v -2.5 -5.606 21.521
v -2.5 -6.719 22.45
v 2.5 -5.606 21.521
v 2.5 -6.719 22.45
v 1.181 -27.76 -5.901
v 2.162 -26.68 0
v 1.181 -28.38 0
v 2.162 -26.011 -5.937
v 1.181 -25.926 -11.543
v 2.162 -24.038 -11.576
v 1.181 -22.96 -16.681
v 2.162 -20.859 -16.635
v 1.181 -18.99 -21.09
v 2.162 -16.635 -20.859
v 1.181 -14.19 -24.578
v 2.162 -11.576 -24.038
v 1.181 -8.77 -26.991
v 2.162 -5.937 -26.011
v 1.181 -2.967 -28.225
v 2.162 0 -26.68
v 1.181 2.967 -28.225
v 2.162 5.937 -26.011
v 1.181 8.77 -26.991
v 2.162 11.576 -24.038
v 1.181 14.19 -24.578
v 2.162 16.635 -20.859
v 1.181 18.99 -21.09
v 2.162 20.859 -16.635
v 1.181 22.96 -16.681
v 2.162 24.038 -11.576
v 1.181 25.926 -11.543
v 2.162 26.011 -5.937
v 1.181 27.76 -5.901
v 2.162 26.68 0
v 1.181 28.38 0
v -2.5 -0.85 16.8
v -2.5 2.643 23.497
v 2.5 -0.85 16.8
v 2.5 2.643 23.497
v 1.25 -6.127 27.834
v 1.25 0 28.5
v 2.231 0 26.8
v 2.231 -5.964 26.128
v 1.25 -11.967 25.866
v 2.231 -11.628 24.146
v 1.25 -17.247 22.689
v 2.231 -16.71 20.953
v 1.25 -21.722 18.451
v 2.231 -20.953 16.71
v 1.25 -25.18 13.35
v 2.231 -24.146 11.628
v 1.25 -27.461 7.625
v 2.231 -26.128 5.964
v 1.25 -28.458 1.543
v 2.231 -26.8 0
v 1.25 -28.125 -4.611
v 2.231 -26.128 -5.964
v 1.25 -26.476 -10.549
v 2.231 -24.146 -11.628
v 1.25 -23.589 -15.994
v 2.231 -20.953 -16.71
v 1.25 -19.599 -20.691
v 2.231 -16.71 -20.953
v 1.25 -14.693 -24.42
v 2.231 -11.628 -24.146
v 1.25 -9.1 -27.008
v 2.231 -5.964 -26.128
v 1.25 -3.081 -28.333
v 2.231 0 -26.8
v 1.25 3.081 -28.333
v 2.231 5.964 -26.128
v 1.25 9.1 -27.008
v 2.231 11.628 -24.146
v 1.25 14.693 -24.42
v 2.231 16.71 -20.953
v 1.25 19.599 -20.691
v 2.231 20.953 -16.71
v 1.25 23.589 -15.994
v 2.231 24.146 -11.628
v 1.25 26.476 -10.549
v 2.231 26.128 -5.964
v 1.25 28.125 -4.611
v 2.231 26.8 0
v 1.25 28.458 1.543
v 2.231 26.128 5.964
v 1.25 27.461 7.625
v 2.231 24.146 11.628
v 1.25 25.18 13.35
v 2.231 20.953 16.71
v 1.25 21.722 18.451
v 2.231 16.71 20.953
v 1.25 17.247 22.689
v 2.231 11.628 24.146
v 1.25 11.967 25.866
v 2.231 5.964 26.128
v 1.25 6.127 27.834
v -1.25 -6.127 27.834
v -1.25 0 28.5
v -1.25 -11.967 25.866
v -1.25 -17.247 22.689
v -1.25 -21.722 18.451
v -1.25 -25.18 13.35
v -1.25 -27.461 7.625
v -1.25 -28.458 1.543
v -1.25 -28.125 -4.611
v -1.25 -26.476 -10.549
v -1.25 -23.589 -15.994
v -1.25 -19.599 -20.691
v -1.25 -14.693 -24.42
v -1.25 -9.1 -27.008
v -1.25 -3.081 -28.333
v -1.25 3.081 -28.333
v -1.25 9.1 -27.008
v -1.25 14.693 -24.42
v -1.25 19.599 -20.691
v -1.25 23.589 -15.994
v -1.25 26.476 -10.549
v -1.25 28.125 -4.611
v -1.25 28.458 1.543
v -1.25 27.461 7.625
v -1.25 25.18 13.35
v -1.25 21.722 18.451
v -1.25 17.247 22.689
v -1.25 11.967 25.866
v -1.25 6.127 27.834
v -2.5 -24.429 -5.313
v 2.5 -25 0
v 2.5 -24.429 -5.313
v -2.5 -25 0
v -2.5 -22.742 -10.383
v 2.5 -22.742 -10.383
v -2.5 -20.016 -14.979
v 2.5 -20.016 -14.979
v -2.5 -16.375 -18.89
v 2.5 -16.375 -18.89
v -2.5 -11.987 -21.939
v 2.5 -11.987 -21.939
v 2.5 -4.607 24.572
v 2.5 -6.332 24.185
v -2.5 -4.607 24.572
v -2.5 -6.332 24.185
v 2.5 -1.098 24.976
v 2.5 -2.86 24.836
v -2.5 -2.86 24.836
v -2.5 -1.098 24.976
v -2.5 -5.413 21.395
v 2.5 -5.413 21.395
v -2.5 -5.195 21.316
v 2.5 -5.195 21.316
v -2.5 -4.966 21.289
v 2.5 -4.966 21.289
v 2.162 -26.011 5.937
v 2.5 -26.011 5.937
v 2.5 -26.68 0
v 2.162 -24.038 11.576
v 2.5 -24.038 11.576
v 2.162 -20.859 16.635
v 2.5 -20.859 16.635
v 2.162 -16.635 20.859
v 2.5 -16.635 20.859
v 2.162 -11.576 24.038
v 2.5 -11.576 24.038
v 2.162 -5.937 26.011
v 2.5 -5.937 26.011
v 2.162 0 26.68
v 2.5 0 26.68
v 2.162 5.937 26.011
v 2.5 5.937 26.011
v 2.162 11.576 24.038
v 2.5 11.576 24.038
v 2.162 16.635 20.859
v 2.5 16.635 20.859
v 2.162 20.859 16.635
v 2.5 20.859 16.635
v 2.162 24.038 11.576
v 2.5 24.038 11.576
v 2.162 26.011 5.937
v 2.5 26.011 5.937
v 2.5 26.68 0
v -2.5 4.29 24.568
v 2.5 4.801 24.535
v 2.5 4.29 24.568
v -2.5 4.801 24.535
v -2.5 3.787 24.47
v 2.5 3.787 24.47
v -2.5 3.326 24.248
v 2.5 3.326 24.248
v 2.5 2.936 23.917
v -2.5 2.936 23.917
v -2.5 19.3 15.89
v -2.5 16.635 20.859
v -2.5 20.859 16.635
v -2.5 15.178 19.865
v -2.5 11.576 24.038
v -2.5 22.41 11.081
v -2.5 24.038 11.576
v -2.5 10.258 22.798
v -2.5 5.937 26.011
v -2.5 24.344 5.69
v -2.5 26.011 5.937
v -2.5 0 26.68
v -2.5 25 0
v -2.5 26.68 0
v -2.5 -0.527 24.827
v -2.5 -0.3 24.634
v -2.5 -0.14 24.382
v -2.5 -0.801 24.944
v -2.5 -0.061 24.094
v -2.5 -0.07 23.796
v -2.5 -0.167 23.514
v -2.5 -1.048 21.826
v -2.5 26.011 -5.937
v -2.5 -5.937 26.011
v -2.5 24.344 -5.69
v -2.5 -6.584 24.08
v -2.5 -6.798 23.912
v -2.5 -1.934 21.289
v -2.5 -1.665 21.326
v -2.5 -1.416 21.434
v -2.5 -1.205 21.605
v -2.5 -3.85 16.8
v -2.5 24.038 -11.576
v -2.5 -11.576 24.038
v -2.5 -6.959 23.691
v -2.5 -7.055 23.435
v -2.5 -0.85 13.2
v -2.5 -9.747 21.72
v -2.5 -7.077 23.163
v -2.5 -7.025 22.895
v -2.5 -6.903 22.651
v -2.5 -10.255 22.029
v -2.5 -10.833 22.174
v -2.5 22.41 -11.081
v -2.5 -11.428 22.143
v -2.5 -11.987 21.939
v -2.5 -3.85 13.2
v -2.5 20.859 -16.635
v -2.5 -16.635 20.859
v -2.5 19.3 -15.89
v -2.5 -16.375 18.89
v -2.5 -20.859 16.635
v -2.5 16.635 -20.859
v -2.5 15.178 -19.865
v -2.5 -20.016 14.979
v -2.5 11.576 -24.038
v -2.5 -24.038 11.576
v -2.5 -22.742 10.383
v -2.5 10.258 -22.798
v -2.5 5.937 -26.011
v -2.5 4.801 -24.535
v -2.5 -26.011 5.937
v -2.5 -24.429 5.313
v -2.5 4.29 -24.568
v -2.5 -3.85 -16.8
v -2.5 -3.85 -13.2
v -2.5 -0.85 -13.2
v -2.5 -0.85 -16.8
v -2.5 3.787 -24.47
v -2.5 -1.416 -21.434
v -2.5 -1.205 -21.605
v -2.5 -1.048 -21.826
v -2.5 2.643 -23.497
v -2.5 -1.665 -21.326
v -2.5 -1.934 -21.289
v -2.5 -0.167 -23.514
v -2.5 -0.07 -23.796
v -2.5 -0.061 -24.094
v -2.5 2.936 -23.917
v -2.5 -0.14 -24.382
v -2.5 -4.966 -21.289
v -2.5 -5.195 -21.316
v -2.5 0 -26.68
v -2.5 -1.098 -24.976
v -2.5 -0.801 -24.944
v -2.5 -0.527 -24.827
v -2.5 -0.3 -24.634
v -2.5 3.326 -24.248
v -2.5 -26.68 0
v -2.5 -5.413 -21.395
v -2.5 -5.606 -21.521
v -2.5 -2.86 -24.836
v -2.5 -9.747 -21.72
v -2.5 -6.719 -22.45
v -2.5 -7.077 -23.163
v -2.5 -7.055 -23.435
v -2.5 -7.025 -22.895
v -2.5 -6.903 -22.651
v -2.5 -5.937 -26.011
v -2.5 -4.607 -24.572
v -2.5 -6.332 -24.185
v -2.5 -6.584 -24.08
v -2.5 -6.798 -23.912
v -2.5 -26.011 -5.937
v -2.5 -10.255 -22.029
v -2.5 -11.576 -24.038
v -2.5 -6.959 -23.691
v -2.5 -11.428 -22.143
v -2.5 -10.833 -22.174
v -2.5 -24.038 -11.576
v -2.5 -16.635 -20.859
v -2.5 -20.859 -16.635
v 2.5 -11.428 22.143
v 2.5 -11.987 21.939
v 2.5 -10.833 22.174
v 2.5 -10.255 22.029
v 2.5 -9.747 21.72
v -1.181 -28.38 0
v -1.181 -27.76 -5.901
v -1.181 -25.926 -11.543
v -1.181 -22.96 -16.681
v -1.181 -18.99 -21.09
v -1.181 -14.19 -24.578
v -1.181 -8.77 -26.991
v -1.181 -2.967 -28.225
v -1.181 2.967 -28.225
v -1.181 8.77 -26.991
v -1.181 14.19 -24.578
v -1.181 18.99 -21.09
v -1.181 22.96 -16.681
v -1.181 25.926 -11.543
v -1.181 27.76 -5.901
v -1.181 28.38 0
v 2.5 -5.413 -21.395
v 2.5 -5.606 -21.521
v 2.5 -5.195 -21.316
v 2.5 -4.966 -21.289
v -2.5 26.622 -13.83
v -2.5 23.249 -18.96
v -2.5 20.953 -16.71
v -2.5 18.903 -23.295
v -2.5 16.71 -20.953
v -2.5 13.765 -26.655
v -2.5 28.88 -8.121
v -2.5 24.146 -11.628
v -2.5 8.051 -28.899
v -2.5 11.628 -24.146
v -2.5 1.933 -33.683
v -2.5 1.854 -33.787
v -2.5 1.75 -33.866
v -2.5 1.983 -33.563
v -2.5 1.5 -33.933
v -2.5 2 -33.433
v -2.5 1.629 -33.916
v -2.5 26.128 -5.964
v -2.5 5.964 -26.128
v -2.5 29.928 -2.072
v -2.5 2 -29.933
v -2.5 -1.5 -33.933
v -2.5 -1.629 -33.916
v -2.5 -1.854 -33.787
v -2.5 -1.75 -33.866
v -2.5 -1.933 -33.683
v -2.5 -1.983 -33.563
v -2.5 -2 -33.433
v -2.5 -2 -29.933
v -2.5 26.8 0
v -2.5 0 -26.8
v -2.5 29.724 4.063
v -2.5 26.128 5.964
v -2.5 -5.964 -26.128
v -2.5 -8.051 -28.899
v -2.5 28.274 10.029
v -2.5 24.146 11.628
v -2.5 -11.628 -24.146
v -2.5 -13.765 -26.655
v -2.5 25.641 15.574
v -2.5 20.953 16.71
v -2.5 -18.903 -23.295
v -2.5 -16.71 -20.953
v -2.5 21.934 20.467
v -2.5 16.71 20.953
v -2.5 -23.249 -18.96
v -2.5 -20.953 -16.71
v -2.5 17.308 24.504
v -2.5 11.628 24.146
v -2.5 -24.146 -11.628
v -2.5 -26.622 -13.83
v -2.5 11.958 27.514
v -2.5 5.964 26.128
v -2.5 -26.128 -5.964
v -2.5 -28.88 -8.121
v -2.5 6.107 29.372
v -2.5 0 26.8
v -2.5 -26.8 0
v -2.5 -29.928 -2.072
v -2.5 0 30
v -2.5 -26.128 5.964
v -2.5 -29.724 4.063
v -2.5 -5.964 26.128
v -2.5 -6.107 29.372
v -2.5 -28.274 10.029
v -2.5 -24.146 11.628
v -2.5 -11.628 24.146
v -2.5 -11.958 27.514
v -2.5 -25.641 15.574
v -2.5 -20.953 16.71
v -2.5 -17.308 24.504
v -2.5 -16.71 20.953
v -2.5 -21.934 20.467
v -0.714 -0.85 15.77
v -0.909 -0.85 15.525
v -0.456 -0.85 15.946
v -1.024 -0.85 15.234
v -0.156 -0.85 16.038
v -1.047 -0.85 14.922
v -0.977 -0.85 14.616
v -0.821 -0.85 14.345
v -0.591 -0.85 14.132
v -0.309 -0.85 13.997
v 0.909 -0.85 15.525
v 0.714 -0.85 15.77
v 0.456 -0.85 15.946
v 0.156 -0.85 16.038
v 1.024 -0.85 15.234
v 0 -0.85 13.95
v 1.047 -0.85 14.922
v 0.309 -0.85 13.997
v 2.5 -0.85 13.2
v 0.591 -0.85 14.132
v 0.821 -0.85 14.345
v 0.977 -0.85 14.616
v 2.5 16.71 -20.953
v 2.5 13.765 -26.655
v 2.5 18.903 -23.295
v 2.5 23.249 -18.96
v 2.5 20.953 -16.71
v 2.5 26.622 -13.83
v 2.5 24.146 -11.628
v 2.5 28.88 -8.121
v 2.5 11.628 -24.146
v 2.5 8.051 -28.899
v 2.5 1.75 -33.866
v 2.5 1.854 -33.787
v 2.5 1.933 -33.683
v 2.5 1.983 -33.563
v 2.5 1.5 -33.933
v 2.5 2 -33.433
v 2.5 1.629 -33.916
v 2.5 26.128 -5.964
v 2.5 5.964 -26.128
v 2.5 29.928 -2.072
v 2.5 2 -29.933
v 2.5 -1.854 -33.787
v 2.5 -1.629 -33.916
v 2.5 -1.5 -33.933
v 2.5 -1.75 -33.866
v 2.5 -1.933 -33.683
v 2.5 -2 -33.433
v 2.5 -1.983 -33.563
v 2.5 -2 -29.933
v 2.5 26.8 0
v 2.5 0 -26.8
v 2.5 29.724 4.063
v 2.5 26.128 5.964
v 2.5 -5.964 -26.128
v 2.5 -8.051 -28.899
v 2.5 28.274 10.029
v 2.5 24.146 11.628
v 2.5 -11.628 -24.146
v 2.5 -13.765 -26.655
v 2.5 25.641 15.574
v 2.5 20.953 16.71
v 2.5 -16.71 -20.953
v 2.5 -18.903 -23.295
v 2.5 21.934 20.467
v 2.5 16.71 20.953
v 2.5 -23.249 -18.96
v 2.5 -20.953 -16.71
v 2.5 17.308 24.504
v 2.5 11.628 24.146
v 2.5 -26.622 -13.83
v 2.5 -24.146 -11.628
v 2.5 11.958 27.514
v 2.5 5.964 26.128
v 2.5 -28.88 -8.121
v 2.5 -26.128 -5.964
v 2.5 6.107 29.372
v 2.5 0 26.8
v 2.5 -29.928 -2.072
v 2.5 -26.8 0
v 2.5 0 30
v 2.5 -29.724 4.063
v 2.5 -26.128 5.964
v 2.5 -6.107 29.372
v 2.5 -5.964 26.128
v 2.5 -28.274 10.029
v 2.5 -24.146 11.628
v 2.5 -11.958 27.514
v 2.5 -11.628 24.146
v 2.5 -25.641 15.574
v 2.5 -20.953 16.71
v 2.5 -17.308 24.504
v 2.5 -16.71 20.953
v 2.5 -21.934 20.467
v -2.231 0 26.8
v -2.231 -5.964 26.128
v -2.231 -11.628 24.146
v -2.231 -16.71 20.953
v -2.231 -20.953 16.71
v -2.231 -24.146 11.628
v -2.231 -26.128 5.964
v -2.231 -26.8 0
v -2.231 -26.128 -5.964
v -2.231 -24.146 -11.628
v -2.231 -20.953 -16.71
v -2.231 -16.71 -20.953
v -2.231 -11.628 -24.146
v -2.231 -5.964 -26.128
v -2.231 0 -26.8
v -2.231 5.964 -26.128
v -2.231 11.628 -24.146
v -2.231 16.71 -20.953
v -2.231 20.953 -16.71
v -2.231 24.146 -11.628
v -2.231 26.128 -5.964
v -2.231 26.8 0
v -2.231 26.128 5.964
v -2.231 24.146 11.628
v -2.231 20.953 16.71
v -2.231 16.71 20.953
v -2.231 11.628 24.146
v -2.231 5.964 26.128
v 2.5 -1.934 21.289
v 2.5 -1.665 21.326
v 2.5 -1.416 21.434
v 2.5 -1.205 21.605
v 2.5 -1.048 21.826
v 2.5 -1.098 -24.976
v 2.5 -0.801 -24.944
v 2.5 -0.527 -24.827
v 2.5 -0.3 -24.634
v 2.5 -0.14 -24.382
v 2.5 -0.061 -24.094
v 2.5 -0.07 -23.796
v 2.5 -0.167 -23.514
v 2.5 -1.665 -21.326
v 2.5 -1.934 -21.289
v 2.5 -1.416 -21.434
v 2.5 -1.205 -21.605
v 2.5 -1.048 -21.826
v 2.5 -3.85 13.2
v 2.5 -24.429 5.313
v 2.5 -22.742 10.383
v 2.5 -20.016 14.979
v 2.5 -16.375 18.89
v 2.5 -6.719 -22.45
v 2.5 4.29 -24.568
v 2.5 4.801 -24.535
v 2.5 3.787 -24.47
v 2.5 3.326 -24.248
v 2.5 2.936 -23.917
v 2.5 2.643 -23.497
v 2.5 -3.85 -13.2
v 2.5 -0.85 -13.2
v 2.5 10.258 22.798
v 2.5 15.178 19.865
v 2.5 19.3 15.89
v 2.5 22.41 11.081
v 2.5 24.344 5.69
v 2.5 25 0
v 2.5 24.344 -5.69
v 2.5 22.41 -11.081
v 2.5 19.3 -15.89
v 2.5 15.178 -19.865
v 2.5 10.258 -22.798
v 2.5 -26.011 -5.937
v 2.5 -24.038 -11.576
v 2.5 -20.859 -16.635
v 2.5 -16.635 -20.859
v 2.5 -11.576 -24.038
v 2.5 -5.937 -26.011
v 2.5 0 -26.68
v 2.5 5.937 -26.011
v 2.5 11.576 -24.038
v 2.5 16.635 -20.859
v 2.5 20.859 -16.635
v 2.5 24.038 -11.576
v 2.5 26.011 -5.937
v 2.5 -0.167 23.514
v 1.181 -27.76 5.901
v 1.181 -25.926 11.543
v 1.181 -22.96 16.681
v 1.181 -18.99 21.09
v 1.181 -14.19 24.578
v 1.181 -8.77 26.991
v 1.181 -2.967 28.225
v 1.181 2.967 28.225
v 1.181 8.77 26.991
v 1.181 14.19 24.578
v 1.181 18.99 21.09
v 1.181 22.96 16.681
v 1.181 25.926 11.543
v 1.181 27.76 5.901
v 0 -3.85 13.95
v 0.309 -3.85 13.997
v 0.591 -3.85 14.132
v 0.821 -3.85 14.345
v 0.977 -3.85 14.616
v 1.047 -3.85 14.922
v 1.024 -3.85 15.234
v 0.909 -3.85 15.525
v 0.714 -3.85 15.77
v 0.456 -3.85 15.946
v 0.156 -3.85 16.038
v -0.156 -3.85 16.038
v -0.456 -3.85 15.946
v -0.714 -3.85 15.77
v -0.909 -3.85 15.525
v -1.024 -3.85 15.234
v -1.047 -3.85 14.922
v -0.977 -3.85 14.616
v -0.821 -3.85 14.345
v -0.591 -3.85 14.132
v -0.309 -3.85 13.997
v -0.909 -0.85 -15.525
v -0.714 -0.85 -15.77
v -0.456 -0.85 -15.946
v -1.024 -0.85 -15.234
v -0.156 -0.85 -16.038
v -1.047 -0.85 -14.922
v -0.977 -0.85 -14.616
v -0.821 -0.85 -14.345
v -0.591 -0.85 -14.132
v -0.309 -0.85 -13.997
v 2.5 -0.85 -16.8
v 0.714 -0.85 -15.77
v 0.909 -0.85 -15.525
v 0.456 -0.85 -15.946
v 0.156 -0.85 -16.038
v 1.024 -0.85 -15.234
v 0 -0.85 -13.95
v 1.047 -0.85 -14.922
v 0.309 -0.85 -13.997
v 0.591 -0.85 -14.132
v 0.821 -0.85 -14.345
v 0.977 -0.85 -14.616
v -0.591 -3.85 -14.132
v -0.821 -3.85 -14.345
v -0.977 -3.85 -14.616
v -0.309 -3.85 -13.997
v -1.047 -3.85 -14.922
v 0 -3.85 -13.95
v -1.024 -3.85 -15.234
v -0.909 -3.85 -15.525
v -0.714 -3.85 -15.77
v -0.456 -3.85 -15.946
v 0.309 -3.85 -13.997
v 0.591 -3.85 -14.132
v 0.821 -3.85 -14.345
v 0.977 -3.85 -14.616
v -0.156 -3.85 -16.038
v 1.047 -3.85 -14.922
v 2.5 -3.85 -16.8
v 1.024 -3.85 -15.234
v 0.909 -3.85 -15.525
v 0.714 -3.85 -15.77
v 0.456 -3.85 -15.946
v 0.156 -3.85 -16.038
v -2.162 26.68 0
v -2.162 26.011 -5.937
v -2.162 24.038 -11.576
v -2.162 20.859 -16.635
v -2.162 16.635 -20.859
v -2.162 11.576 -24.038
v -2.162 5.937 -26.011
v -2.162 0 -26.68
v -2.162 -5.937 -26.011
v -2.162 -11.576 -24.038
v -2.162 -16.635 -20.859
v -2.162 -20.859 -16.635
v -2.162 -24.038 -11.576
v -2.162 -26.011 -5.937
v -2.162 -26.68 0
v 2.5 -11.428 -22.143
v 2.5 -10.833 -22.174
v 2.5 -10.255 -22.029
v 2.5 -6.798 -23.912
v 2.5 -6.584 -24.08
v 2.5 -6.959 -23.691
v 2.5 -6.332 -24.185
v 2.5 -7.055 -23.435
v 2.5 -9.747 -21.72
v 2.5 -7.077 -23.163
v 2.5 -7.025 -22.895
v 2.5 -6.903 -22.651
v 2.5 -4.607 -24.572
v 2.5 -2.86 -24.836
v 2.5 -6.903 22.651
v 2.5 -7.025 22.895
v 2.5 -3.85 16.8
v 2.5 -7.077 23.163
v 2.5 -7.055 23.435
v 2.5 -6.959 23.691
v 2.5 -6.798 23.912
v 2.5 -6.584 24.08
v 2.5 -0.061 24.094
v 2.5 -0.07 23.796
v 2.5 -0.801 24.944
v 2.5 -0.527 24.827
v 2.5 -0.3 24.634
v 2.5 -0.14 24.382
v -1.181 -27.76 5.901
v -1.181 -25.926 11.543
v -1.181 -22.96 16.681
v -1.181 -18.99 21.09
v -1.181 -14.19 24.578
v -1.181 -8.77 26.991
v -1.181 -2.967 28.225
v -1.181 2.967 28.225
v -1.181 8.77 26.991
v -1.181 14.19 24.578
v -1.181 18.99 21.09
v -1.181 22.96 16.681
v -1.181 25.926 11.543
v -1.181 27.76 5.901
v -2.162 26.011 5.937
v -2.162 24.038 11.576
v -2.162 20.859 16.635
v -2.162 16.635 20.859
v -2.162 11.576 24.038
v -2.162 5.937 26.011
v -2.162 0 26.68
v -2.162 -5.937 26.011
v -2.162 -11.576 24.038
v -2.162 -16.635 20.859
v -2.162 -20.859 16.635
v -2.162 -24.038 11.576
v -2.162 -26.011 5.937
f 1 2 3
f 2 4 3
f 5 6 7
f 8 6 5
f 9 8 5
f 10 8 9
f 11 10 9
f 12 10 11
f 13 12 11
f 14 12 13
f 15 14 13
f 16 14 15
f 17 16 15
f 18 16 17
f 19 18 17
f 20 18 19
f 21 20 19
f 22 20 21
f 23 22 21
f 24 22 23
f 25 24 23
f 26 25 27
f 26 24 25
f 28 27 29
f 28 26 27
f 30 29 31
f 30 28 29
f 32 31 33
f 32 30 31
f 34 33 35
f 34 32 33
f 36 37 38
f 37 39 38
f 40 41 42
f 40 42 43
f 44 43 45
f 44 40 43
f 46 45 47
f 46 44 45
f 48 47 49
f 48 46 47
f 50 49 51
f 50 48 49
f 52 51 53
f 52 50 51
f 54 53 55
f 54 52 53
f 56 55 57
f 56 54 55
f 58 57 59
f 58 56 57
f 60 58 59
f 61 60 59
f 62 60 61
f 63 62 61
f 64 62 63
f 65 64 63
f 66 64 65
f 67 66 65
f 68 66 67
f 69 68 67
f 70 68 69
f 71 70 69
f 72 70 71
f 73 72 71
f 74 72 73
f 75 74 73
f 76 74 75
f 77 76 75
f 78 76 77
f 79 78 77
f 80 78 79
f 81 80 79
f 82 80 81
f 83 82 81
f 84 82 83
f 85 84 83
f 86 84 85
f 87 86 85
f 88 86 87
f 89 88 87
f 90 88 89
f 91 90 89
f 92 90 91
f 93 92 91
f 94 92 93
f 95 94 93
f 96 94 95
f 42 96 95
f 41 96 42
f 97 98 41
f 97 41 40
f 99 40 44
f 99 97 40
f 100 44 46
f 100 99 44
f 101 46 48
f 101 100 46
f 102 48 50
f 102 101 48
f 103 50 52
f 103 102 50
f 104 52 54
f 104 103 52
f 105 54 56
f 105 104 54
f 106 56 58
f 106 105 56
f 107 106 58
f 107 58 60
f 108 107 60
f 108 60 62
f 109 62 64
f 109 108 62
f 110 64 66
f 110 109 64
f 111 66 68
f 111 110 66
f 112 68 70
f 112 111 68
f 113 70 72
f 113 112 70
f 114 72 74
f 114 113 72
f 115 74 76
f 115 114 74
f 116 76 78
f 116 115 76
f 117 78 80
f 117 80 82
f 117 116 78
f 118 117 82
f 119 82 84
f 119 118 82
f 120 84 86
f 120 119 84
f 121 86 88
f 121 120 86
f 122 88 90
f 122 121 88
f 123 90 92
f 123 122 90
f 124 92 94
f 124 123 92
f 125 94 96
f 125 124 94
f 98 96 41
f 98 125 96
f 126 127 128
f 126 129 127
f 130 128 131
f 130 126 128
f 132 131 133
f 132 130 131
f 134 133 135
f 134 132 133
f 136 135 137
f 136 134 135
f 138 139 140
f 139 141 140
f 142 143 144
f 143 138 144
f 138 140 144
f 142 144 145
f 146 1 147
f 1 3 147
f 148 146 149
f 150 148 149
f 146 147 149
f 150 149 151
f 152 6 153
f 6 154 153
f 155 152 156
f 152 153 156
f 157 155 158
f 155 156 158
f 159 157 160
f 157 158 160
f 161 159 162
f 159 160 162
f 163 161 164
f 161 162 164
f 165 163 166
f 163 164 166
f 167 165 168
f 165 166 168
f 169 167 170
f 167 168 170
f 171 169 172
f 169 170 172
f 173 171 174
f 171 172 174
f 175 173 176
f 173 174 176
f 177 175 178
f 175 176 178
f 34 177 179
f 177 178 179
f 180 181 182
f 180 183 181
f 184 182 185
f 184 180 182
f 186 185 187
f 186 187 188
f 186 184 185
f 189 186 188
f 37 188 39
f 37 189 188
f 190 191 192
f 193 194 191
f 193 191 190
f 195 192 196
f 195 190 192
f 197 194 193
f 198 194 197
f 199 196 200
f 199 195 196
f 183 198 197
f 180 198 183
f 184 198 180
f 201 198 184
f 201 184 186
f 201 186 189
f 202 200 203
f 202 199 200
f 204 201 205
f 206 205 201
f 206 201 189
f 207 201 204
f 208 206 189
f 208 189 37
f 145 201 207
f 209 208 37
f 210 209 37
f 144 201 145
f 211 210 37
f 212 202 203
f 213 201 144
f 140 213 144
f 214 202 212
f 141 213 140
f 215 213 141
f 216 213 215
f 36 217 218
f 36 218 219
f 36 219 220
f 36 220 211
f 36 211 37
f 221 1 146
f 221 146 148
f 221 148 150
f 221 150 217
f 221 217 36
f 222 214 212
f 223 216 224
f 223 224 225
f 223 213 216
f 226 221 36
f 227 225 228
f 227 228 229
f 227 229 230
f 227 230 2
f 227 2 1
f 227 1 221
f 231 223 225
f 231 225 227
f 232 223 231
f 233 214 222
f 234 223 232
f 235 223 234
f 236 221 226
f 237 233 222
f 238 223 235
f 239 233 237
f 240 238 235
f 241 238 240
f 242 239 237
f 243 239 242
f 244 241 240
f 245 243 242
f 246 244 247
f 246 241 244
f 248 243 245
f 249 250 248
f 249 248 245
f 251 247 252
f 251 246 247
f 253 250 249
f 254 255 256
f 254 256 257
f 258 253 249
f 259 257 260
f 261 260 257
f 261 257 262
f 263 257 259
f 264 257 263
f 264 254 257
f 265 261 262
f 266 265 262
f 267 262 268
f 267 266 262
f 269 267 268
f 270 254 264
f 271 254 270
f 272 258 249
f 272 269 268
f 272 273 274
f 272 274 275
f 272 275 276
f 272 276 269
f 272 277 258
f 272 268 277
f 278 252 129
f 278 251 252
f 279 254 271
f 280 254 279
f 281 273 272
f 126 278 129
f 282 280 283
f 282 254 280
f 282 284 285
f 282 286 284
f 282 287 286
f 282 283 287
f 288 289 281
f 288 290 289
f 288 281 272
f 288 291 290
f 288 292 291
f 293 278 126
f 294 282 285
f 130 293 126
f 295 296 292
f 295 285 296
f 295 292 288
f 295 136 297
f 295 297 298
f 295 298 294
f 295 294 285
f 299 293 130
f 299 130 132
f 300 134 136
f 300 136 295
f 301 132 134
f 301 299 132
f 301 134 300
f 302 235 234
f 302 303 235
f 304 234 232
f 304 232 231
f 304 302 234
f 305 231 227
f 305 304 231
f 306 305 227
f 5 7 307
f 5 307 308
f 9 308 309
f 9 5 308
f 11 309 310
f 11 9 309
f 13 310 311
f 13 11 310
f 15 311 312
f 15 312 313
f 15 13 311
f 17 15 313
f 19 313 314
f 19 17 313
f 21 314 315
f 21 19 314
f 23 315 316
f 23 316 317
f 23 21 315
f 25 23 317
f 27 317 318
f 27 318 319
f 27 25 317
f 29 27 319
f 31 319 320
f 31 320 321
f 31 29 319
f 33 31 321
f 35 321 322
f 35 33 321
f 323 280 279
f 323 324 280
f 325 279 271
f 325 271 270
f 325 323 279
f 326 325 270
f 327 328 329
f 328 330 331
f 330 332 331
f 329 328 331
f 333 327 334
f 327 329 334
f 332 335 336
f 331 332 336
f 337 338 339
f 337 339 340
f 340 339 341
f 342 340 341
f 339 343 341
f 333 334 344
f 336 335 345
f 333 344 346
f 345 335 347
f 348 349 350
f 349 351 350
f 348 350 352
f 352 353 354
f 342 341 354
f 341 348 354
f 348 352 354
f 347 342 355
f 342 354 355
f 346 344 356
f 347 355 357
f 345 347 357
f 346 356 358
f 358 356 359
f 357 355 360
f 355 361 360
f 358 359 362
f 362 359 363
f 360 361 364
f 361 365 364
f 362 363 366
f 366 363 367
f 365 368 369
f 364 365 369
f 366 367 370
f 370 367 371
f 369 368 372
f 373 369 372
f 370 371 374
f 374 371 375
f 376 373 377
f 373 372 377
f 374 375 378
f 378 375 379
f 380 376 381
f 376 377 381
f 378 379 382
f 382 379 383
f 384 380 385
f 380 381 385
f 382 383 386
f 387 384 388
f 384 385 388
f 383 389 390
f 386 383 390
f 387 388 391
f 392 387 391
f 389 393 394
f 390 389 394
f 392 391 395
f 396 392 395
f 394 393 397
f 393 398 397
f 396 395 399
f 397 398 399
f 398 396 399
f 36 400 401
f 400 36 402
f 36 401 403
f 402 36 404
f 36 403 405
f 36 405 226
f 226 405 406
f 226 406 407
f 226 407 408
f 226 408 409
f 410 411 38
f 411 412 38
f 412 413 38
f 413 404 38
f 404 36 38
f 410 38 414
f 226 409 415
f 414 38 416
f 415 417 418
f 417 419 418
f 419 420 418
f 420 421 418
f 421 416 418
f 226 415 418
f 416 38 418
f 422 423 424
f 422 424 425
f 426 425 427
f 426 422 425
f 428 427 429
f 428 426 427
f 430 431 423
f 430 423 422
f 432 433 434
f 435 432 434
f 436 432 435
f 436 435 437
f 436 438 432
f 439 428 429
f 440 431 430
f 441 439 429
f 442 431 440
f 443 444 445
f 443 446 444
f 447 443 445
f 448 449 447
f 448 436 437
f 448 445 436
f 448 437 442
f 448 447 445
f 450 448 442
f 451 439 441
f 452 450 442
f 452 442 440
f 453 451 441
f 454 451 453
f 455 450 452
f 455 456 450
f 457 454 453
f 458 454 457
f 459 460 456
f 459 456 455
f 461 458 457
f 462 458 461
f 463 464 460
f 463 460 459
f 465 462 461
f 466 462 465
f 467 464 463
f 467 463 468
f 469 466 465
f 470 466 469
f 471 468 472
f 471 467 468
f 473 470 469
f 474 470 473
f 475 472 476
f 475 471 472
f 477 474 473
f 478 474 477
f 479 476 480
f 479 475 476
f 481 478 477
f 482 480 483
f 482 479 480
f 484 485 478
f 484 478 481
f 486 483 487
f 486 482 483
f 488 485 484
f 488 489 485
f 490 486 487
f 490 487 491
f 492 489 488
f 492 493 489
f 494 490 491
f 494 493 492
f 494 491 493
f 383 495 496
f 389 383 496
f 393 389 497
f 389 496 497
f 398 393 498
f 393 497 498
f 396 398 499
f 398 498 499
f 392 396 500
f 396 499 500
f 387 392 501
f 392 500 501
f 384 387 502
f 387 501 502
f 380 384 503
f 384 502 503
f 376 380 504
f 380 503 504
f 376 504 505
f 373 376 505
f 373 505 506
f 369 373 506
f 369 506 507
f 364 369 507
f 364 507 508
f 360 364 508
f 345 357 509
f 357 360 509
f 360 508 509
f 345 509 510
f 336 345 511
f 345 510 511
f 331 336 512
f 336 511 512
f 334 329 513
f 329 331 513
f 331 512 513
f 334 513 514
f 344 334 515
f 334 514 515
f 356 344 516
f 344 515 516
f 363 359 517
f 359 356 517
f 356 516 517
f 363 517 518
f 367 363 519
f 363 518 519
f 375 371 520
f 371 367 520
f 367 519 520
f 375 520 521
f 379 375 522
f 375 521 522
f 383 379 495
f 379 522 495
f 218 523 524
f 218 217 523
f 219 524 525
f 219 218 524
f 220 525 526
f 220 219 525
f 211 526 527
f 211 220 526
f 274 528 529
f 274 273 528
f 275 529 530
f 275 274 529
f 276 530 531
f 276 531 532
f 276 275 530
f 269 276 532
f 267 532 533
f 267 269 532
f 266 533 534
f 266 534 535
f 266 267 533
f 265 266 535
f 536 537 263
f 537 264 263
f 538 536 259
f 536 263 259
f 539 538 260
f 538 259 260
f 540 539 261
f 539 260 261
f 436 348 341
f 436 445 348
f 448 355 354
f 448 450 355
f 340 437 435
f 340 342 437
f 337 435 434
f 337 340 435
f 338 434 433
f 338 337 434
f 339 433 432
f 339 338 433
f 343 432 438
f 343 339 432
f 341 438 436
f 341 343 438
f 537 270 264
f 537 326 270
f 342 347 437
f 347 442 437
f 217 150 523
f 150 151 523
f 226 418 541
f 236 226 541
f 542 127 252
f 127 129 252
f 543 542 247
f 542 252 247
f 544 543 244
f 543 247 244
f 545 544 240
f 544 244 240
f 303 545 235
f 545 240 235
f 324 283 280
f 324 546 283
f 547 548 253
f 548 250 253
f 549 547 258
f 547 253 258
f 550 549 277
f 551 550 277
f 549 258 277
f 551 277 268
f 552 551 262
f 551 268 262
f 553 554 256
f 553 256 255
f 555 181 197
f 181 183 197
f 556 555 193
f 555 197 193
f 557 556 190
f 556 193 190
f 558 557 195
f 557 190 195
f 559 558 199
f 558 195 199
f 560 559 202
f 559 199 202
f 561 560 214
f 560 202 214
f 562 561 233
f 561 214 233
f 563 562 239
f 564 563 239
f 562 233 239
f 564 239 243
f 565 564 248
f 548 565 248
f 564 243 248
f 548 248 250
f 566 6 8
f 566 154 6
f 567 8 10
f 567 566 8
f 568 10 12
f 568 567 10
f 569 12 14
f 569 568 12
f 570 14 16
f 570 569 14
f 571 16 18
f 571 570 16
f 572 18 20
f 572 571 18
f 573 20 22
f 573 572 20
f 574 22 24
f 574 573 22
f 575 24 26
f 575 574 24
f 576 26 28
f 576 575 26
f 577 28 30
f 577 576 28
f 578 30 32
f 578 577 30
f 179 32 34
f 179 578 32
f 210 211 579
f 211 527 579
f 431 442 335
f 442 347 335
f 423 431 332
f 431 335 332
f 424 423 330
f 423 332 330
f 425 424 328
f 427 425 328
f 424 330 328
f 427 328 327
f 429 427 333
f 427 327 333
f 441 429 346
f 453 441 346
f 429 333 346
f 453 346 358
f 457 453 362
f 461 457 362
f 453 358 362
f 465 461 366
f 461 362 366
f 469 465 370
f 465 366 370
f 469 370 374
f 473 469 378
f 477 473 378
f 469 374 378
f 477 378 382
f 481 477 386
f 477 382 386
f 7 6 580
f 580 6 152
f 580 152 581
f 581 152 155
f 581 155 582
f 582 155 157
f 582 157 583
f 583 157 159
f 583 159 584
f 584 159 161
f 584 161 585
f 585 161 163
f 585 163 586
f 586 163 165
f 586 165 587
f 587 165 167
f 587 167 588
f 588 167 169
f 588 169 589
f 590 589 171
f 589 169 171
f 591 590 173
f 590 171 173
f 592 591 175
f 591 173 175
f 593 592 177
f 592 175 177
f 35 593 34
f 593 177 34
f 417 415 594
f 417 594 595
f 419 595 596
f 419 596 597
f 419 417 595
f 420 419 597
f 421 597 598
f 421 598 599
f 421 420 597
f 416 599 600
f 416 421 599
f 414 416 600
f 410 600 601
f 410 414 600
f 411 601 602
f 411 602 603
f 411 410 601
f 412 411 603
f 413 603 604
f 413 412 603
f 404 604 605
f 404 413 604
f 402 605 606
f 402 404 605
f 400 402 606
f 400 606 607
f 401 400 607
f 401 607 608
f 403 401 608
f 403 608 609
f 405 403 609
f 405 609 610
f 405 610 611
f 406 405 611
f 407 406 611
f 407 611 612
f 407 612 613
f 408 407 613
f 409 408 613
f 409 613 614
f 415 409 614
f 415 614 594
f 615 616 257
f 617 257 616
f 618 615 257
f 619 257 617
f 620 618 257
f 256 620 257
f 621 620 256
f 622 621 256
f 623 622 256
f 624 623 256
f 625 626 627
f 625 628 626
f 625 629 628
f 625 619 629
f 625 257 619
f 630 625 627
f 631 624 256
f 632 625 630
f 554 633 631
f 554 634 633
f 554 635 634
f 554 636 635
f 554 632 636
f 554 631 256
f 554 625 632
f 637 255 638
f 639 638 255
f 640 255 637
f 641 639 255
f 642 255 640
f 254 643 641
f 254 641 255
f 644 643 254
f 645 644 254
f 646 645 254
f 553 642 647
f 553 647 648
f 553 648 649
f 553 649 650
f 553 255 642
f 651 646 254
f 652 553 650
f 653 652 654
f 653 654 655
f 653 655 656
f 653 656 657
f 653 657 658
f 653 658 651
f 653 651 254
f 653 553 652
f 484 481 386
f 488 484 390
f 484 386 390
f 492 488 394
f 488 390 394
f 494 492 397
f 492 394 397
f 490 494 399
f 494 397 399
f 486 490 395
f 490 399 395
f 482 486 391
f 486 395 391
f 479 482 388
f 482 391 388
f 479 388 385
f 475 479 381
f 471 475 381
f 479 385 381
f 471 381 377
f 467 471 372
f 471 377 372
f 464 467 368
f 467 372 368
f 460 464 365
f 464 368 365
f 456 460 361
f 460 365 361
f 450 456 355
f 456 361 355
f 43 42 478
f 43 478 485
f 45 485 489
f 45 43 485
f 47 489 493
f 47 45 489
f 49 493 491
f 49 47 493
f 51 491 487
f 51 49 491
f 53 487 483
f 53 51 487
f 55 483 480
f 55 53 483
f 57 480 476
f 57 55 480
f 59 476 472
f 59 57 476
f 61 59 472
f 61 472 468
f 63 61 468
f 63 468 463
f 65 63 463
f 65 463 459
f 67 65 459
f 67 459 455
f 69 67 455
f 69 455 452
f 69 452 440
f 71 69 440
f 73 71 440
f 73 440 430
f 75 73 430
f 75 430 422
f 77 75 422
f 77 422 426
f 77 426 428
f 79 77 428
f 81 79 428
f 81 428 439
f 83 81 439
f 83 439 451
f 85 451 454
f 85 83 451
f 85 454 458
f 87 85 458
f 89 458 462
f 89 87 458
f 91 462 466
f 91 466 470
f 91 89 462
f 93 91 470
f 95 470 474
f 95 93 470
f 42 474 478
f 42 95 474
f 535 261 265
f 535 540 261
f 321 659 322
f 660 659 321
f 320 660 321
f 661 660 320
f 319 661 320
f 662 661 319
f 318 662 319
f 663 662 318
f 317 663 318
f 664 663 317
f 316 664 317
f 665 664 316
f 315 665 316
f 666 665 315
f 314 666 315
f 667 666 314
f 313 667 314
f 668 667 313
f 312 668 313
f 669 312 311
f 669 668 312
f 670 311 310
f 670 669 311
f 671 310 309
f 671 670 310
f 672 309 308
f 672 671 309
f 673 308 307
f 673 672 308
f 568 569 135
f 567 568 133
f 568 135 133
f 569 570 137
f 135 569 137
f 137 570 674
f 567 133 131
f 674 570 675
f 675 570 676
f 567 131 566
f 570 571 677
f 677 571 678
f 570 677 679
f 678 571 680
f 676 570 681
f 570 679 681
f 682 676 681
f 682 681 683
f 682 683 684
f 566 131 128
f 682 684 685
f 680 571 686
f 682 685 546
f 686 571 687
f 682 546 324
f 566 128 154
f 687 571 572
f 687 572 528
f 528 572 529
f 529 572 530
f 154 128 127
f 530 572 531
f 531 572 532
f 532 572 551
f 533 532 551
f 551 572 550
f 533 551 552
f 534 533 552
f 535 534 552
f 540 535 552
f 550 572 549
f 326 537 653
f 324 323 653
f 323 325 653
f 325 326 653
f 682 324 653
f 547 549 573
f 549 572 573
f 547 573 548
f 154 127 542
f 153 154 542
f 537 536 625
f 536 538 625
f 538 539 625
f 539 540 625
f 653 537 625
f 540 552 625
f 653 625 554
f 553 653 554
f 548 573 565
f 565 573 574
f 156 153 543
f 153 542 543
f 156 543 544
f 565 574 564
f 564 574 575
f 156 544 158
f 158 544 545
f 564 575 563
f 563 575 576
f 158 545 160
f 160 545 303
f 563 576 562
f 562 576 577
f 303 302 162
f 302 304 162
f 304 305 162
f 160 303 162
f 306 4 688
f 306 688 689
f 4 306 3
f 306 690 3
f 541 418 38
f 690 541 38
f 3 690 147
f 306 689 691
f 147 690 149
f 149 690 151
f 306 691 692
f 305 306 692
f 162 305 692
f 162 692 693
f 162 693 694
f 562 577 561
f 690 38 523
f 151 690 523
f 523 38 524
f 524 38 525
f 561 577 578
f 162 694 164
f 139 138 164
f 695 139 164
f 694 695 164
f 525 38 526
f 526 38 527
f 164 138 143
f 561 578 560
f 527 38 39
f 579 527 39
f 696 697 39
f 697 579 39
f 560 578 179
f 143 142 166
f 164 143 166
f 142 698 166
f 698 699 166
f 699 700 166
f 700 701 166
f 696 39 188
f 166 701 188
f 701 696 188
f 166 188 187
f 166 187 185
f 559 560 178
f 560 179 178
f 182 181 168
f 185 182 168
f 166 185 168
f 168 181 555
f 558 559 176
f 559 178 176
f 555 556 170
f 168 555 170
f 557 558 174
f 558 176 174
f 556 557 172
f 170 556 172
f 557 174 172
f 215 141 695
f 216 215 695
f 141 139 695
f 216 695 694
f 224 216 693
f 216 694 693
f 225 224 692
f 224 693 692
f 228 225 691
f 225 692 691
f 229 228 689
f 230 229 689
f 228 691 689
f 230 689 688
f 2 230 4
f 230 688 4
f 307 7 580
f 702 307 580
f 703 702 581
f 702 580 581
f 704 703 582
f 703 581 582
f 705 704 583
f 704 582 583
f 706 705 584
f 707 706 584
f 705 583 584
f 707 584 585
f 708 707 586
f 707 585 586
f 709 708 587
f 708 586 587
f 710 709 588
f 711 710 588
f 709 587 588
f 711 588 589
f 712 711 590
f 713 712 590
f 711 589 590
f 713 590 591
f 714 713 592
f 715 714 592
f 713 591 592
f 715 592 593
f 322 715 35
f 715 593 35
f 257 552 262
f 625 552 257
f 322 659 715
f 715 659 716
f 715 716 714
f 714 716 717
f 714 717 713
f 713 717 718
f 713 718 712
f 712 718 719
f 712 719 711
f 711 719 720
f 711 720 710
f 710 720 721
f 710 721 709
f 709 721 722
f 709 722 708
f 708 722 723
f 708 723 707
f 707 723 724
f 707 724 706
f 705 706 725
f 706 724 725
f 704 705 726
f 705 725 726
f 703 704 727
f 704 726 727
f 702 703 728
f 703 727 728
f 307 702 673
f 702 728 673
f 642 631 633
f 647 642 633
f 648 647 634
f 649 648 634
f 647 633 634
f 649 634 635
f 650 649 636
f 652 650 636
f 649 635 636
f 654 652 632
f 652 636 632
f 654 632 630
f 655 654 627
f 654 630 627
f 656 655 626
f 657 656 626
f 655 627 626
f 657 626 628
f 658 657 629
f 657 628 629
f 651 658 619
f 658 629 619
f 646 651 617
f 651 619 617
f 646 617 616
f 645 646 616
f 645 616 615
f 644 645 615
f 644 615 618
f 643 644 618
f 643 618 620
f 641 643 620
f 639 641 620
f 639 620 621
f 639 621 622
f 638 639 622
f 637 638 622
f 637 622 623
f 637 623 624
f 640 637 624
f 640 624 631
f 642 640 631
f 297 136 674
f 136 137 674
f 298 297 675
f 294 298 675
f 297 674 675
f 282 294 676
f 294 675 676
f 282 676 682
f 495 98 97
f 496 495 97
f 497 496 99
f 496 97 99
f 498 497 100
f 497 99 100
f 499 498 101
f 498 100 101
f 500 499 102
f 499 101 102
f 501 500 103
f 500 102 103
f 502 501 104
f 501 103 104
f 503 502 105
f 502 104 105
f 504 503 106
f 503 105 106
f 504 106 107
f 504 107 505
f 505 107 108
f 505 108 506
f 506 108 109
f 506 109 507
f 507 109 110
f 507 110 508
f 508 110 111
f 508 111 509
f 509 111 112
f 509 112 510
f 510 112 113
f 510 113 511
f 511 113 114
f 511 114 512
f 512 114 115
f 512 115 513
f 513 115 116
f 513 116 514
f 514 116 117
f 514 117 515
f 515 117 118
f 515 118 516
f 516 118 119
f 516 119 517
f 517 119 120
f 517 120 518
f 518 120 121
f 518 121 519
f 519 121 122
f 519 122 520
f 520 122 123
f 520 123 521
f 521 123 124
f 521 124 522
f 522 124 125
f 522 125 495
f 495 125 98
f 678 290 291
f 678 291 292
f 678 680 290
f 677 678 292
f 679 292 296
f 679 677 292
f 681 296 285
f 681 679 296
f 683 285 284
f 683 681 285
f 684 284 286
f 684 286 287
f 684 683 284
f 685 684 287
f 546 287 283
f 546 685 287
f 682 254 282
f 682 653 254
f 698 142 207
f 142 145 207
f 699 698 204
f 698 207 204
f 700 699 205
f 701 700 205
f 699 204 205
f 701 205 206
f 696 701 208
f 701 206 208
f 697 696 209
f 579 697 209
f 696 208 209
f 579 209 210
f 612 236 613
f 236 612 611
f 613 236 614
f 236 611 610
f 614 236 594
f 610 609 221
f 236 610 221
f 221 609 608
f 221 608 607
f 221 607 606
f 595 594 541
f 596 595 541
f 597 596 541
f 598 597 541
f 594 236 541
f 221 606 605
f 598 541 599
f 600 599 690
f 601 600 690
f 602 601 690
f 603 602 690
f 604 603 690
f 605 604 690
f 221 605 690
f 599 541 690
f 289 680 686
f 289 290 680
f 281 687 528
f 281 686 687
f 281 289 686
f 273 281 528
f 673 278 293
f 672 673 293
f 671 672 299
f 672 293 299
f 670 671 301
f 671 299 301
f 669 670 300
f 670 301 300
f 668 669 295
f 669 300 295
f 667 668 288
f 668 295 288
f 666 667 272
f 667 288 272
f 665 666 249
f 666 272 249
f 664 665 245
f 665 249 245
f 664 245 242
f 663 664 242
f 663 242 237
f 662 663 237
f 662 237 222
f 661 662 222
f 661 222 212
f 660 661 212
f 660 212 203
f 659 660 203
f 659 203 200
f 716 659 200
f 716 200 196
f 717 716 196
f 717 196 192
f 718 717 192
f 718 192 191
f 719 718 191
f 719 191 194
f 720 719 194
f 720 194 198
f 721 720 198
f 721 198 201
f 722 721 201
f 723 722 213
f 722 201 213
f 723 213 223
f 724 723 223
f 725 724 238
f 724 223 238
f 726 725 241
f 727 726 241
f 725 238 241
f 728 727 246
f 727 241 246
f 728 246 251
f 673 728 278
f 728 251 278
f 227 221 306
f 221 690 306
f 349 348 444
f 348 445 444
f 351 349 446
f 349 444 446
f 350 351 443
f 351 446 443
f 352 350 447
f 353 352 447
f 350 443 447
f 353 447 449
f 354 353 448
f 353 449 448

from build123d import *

# Parameters (mm, degrees)
REVOLVE2_ANGLE      = 180
BOSS_EXTRUDE1_DEPTH = 2.5
FILLET1_R           = 2
FILLET2_R           = 1
CUT_EXTRUDE1_REACH  = 44.5
SKETCH4_R           = 1.05
SKETCH5_W           = 4
SKETCH5_H           = 4
BOSS_EXTRUDE2_DEPTH = 2.5
FILLET3_R           = 0.5


with BuildPart() as part:
    # Sketch2 → Revolve1 (revolve)
    with BuildSketch(Plane(origin=(0, 0, 0), x_dir=(1, 0, 0), z_dir=(0, 1, 0)), mode=Mode.PRIVATE) as revolve1_sk:
        Polygon((-1.25, 28.5), (0, 28.5), (0, 30), (-2.5, 30), (-2.5, 26.8), (-2.231495458, 26.8), align=None)
    revolve1 = revolve(revolve1_sk.sketch.rotate(Axis((0, 0, 0), (1, 0, 0)), 180), axis=Axis((0, 0, 0), (1, 0, 0)))


with BuildPart() as body_2:
    # Sketch2<3> → Revolve2 (revolve, symmetric)
    with BuildSketch(Plane(origin=(0, 0, 0), x_dir=(1, 0, 0), z_dir=(0, 1, 0))) as revolve2_sk:
        Polygon((-2.5, 25), (0, 25), (0, 28.38), (-1.180717968, 28.38), (-2.162213425, 26.68), (-2.5, 26.68), align=None)
    revolve2 = revolve(axis=Axis((0, 0, 0), (1, 0, 0)), revolution_arc=REVOLVE2_ANGLE / 2)
    revolve2 = revolve2 + revolve(revolve2_sk.sketch, axis=Axis((0, 0, 0), (-1, 0, 0)), revolution_arc=REVOLVE2_ANGLE / 2)


with BuildPart() as part_1:
    add(part.part)

    add(body_2.part)  # Mirror1 merges body 2
    # Mirror1: Revolve1, Revolve2 across plane
    add(revolve1.mirror(Plane(origin=(0, 0, 0), x_dir=(0, 0, 1), z_dir=(1, 0, 0))))
    add(revolve2.mirror(Plane(origin=(0, 0, 0), x_dir=(0, 0, 1), z_dir=(1, 0, 0))))

    # Sketch3 → Boss-Extrude1 (add, symmetric)
    with BuildSketch(Plane(origin=(0, 0, 0), x_dir=(0, 0, -1), z_dir=(1, 0, 0))):
        with BuildLine():
            Line((24.779575684, 3.312495874), (16.8, -0.85))
            Line((16.8, -0.85), (13.2, -0.85))
            Line((13.2, -0.85), (13.2, -3.85))
            Line((13.2, -3.85), (16.8, -3.85))
            Line((16.8, -3.85), (22.565633273, -10.760678184))
            ThreePointArc((22.565633273, -10.760678184), (23.138338492, -9.466640999), (23.636907605, -8.142272341))
            Line((23.636907605, -8.142272341), (21.288980036, -5.328050372))
            Line((21.288980036, -5.328050372), (21.288980036, -1.328050372))
            Line((21.288980036, -1.328050372), (24.99270325, 0.603973737))
            ThreePointArc((24.99270325, 0.603973737), (24.92296051, 1.961132171), (24.779575684, 3.312495874))
        make_face()
    extrude(amount=BOSS_EXTRUDE1_DEPTH, both=True)

    # Fillet1
    fillet1_edges = [part_1.edges().sort_by_distance(p)[0] for p in [
        (0, 3.312495874, -24.779575684),
        (0, -10.760678184, -22.565633273),
    ]]
    fillet(fillet1_edges, radius=FILLET1_R)

    # Fillet2
    fillet2_edges = [part_1.edges().sort_by_distance(p)[0] for p in [
        (0, -1.328050372, -21.288980036),
        (0, 0.603973737, -24.99270325),
        (0, -8.142272341, -23.636907605),
        (0, -5.328050372, -21.288980036),
    ]]
    fillet(fillet2_edges, radius=FILLET2_R)

    # Sketch4 → Cut-Extrude1 (cut, up to next)
    with BuildSketch(Plane(origin=(0, 0, 0), x_dir=(1, 0, 0), z_dir=(0, 1, 0)), mode=Mode.PRIVATE) as cut_extrude1_sk1:
        with Locations(Location((0, 15, 0), (0, 0, 270))):
            Circle(SKETCH4_R)
    cut_extrude1_tool1 = extrude(cut_extrude1_sk1.sketch, amount=-CUT_EXTRUDE1_REACH, mode=Mode.PRIVATE) & part_1.part
    add(cut_extrude1_tool1.solids().sort_by_distance((0, 0, -15))[0], mode=Mode.SUBTRACT)

    # Mirror2: part across plane


with BuildPart() as part_2:
    add(part_1.part)
    add(part_1.part.mirror(Plane.XY))

    # Sketch5 → Boss-Extrude2 (add, symmetric)
    with BuildSketch(Plane(origin=(0, 0, 0), x_dir=(0, 0, -1), z_dir=(1, 0, 0))):
        with Locations((31.933259094, 0)):
            Rectangle(SKETCH5_W, SKETCH5_H)
    extrude(amount=BOSS_EXTRUDE2_DEPTH, both=True)

    # Fillet3
    fillet3_edges = [part_2.edges().sort_by_distance(p)[0] for p in [
        (0, 2, -33.933259094),
        (0, -2, -33.933259094),
    ]]
    fillet(fillet3_edges, radius=FILLET3_R)


solid = part_2.part
